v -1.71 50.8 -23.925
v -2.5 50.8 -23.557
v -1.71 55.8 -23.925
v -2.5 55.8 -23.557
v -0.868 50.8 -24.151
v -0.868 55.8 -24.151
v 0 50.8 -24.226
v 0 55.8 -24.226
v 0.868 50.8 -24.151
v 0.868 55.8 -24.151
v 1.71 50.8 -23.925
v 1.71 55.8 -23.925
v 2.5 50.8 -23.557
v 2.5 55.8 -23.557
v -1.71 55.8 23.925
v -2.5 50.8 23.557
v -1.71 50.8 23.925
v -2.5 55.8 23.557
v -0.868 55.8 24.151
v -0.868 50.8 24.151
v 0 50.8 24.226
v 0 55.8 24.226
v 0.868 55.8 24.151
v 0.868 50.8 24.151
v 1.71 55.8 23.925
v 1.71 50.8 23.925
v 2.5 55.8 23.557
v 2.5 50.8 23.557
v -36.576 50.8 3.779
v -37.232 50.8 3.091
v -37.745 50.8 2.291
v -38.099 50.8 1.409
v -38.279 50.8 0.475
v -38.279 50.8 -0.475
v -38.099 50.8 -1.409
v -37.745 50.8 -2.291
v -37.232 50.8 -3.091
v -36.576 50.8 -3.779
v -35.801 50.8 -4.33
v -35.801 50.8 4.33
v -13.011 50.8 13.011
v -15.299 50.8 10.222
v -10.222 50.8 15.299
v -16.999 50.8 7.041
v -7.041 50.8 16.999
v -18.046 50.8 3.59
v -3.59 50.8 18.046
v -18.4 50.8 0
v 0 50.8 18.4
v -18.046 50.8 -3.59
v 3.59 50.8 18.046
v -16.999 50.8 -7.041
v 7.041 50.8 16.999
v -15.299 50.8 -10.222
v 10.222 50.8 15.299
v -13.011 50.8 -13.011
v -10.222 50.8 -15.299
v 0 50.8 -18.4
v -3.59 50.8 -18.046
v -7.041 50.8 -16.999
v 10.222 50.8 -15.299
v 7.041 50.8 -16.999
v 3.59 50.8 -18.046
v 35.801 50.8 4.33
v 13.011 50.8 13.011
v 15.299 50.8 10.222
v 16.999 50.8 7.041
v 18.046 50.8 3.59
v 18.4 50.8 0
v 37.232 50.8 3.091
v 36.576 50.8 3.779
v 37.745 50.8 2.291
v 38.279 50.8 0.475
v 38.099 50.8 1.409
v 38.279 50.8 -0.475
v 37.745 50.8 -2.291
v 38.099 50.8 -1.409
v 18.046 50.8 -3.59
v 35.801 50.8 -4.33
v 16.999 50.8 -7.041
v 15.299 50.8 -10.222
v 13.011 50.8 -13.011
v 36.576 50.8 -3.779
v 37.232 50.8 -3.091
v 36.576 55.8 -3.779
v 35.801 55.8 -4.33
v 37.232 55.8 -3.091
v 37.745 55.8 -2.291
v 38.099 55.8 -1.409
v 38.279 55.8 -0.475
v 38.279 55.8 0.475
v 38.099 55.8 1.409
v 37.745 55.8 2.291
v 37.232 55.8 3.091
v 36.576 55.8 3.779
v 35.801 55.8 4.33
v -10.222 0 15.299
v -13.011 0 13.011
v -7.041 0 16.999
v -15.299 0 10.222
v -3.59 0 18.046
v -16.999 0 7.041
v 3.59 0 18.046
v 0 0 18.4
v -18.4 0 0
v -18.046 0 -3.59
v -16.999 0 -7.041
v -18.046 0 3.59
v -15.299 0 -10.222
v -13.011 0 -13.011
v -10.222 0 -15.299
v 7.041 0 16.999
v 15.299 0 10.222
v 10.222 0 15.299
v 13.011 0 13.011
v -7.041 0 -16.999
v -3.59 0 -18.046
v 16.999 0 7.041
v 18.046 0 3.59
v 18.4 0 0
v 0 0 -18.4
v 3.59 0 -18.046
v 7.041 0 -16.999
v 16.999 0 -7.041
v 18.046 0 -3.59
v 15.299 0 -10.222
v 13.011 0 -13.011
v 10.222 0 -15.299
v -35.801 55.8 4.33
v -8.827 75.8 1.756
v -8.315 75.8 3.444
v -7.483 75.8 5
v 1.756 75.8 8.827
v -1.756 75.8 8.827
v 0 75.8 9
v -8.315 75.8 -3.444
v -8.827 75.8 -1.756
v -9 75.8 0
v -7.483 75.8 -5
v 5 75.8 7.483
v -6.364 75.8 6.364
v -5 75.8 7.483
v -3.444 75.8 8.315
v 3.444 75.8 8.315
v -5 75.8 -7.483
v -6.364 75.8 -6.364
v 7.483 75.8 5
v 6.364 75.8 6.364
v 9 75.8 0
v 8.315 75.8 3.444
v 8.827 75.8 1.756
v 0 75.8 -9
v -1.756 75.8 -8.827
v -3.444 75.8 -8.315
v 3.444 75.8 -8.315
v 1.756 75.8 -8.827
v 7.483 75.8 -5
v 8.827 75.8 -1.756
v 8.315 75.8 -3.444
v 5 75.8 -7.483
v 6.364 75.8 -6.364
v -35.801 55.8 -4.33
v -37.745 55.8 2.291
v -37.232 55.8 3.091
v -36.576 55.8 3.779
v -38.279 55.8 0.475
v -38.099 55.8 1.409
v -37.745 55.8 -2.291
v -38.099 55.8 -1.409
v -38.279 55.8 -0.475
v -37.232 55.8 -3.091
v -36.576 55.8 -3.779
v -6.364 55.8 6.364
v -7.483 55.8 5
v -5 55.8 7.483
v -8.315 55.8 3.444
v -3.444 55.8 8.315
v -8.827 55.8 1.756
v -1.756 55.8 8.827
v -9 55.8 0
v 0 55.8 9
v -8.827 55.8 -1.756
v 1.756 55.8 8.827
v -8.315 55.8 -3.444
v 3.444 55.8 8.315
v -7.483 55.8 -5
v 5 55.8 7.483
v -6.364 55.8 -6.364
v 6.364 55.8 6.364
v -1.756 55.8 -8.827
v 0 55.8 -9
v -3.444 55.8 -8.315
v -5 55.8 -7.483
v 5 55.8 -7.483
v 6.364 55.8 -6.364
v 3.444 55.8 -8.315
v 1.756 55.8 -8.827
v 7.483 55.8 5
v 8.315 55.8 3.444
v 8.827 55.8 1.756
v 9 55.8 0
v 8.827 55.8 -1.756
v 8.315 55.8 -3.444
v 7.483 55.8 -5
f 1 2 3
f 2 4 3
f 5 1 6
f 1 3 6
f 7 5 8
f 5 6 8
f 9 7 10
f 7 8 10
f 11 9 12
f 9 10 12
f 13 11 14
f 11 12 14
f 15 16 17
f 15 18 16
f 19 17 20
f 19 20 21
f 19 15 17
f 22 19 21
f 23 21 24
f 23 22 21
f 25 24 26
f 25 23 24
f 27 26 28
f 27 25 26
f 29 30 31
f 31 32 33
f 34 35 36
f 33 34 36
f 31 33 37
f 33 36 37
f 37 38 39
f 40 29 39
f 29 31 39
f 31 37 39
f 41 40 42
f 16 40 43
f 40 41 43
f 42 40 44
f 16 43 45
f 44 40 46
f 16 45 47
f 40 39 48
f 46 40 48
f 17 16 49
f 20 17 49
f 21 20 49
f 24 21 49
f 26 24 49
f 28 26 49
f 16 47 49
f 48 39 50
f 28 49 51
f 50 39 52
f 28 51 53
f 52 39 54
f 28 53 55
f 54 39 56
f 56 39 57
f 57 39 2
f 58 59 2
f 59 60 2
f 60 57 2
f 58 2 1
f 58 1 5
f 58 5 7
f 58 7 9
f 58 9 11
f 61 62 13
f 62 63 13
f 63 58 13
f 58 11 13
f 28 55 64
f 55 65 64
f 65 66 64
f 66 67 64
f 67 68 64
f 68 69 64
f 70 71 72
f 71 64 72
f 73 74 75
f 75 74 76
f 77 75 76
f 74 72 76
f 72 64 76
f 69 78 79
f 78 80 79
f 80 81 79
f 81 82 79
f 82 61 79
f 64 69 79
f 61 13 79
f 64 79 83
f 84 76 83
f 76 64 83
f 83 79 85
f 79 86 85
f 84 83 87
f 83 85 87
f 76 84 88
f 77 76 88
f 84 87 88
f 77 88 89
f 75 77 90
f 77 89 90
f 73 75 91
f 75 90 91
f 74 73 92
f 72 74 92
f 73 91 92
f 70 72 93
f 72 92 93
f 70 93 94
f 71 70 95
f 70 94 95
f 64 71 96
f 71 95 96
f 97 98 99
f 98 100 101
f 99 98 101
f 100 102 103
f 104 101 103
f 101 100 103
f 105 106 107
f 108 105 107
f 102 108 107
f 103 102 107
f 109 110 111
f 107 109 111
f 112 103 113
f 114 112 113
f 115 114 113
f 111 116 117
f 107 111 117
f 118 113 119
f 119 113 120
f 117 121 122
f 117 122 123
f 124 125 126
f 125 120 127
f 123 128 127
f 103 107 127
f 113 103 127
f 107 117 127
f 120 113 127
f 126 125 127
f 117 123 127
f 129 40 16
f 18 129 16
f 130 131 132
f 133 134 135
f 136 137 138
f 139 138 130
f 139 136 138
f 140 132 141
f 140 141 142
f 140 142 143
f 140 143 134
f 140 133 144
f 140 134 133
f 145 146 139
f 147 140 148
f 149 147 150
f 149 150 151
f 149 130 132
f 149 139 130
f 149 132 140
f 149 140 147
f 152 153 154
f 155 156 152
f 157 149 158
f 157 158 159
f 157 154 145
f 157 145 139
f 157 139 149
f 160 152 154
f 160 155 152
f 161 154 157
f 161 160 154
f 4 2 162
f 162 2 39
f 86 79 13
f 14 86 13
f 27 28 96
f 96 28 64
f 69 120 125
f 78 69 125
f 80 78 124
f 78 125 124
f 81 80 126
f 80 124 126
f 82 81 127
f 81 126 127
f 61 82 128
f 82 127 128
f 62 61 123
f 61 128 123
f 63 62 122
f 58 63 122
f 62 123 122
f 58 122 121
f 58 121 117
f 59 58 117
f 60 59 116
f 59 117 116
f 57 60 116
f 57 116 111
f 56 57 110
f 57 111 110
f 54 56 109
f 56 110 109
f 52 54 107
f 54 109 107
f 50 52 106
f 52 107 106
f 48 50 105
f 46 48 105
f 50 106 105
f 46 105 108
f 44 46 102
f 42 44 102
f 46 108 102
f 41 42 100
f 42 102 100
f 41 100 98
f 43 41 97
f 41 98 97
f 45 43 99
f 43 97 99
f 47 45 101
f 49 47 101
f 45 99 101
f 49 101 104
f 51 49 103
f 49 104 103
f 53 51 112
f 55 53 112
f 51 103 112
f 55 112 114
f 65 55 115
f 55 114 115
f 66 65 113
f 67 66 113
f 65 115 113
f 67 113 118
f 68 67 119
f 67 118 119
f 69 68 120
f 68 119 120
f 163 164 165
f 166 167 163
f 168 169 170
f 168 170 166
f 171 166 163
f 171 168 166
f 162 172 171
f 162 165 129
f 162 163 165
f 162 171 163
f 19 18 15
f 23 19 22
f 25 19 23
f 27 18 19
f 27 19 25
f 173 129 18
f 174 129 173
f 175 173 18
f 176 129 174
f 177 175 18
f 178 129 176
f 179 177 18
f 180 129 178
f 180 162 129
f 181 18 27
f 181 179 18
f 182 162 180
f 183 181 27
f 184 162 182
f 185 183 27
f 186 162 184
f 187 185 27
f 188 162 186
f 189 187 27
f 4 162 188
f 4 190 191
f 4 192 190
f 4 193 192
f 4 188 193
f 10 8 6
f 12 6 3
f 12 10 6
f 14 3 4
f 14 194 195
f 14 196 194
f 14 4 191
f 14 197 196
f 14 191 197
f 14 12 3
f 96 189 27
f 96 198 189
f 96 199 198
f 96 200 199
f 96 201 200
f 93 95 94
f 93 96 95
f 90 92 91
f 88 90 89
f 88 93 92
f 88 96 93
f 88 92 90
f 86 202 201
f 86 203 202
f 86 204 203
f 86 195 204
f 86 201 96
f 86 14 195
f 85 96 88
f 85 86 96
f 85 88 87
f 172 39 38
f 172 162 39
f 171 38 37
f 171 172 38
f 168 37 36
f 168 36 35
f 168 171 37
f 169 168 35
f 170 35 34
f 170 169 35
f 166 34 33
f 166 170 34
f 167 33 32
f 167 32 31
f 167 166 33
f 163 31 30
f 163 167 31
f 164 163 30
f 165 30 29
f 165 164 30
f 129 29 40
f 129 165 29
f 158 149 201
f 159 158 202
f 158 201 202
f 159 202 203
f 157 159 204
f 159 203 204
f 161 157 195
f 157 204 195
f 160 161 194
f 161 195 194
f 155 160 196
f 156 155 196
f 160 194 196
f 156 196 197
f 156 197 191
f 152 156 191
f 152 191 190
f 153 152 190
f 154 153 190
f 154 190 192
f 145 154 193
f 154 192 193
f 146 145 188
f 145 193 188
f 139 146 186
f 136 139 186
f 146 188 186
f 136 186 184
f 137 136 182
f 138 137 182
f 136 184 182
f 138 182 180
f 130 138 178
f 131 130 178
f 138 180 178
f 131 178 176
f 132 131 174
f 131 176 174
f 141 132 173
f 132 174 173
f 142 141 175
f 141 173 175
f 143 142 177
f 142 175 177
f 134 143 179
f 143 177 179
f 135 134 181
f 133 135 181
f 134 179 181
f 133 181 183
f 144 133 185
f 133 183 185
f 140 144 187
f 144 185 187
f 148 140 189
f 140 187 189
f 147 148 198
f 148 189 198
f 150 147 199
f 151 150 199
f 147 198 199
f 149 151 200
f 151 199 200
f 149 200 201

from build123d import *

# Parameters (mm, degrees)
SKETCH1_R           = 18.4
BOSS_EXTRUDE1_DEPTH = 50.8
BOSS_EXTRUDE2_DEPTH = 5
FILLET1_R           = 5
SKETCH3_R           = 9
BOSS_EXTRUDE3_DEPTH = 20


with BuildPart() as part:
    # Sketch1 → Boss-Extrude1 (new body)
    with BuildSketch(Plane(origin=(0, 0, 0), x_dir=(1, 0, 0), z_dir=(0, 1, 0))):
        Circle(SKETCH1_R)
    extrude(amount=BOSS_EXTRUDE1_DEPTH)

    # Sketch2 → Boss-Extrude2 (add)
    with BuildSketch(Plane(origin=(0, 50.8, 0), x_dir=(1, 0, 0), z_dir=(0, 1, 0))):
        Polygon((0, 25), (-43.301270189, 0), (0, -25), (43.301270189, 0), align=None)
    extrude(amount=BOSS_EXTRUDE2_DEPTH)

    # Fillet1
    fillet1_edges = [part.edges().sort_by_distance(p)[0] for p in [
        (43.301270189, 53.3, 0),
        (0, 53.3, -25),
        (-43.301270189, 53.3, 0),
        (0, 53.3, 25),
    ]]
    fillet(fillet1_edges, radius=FILLET1_R)

    # Sketch3 → Boss-Extrude3 (add)
    with BuildSketch(Plane(origin=(0, 55.8, 0), x_dir=(1, 0, 0), z_dir=(0, 1, 0))):
        Circle(SKETCH3_R)
    extrude(amount=BOSS_EXTRUDE3_DEPTH)


solid = part.part
